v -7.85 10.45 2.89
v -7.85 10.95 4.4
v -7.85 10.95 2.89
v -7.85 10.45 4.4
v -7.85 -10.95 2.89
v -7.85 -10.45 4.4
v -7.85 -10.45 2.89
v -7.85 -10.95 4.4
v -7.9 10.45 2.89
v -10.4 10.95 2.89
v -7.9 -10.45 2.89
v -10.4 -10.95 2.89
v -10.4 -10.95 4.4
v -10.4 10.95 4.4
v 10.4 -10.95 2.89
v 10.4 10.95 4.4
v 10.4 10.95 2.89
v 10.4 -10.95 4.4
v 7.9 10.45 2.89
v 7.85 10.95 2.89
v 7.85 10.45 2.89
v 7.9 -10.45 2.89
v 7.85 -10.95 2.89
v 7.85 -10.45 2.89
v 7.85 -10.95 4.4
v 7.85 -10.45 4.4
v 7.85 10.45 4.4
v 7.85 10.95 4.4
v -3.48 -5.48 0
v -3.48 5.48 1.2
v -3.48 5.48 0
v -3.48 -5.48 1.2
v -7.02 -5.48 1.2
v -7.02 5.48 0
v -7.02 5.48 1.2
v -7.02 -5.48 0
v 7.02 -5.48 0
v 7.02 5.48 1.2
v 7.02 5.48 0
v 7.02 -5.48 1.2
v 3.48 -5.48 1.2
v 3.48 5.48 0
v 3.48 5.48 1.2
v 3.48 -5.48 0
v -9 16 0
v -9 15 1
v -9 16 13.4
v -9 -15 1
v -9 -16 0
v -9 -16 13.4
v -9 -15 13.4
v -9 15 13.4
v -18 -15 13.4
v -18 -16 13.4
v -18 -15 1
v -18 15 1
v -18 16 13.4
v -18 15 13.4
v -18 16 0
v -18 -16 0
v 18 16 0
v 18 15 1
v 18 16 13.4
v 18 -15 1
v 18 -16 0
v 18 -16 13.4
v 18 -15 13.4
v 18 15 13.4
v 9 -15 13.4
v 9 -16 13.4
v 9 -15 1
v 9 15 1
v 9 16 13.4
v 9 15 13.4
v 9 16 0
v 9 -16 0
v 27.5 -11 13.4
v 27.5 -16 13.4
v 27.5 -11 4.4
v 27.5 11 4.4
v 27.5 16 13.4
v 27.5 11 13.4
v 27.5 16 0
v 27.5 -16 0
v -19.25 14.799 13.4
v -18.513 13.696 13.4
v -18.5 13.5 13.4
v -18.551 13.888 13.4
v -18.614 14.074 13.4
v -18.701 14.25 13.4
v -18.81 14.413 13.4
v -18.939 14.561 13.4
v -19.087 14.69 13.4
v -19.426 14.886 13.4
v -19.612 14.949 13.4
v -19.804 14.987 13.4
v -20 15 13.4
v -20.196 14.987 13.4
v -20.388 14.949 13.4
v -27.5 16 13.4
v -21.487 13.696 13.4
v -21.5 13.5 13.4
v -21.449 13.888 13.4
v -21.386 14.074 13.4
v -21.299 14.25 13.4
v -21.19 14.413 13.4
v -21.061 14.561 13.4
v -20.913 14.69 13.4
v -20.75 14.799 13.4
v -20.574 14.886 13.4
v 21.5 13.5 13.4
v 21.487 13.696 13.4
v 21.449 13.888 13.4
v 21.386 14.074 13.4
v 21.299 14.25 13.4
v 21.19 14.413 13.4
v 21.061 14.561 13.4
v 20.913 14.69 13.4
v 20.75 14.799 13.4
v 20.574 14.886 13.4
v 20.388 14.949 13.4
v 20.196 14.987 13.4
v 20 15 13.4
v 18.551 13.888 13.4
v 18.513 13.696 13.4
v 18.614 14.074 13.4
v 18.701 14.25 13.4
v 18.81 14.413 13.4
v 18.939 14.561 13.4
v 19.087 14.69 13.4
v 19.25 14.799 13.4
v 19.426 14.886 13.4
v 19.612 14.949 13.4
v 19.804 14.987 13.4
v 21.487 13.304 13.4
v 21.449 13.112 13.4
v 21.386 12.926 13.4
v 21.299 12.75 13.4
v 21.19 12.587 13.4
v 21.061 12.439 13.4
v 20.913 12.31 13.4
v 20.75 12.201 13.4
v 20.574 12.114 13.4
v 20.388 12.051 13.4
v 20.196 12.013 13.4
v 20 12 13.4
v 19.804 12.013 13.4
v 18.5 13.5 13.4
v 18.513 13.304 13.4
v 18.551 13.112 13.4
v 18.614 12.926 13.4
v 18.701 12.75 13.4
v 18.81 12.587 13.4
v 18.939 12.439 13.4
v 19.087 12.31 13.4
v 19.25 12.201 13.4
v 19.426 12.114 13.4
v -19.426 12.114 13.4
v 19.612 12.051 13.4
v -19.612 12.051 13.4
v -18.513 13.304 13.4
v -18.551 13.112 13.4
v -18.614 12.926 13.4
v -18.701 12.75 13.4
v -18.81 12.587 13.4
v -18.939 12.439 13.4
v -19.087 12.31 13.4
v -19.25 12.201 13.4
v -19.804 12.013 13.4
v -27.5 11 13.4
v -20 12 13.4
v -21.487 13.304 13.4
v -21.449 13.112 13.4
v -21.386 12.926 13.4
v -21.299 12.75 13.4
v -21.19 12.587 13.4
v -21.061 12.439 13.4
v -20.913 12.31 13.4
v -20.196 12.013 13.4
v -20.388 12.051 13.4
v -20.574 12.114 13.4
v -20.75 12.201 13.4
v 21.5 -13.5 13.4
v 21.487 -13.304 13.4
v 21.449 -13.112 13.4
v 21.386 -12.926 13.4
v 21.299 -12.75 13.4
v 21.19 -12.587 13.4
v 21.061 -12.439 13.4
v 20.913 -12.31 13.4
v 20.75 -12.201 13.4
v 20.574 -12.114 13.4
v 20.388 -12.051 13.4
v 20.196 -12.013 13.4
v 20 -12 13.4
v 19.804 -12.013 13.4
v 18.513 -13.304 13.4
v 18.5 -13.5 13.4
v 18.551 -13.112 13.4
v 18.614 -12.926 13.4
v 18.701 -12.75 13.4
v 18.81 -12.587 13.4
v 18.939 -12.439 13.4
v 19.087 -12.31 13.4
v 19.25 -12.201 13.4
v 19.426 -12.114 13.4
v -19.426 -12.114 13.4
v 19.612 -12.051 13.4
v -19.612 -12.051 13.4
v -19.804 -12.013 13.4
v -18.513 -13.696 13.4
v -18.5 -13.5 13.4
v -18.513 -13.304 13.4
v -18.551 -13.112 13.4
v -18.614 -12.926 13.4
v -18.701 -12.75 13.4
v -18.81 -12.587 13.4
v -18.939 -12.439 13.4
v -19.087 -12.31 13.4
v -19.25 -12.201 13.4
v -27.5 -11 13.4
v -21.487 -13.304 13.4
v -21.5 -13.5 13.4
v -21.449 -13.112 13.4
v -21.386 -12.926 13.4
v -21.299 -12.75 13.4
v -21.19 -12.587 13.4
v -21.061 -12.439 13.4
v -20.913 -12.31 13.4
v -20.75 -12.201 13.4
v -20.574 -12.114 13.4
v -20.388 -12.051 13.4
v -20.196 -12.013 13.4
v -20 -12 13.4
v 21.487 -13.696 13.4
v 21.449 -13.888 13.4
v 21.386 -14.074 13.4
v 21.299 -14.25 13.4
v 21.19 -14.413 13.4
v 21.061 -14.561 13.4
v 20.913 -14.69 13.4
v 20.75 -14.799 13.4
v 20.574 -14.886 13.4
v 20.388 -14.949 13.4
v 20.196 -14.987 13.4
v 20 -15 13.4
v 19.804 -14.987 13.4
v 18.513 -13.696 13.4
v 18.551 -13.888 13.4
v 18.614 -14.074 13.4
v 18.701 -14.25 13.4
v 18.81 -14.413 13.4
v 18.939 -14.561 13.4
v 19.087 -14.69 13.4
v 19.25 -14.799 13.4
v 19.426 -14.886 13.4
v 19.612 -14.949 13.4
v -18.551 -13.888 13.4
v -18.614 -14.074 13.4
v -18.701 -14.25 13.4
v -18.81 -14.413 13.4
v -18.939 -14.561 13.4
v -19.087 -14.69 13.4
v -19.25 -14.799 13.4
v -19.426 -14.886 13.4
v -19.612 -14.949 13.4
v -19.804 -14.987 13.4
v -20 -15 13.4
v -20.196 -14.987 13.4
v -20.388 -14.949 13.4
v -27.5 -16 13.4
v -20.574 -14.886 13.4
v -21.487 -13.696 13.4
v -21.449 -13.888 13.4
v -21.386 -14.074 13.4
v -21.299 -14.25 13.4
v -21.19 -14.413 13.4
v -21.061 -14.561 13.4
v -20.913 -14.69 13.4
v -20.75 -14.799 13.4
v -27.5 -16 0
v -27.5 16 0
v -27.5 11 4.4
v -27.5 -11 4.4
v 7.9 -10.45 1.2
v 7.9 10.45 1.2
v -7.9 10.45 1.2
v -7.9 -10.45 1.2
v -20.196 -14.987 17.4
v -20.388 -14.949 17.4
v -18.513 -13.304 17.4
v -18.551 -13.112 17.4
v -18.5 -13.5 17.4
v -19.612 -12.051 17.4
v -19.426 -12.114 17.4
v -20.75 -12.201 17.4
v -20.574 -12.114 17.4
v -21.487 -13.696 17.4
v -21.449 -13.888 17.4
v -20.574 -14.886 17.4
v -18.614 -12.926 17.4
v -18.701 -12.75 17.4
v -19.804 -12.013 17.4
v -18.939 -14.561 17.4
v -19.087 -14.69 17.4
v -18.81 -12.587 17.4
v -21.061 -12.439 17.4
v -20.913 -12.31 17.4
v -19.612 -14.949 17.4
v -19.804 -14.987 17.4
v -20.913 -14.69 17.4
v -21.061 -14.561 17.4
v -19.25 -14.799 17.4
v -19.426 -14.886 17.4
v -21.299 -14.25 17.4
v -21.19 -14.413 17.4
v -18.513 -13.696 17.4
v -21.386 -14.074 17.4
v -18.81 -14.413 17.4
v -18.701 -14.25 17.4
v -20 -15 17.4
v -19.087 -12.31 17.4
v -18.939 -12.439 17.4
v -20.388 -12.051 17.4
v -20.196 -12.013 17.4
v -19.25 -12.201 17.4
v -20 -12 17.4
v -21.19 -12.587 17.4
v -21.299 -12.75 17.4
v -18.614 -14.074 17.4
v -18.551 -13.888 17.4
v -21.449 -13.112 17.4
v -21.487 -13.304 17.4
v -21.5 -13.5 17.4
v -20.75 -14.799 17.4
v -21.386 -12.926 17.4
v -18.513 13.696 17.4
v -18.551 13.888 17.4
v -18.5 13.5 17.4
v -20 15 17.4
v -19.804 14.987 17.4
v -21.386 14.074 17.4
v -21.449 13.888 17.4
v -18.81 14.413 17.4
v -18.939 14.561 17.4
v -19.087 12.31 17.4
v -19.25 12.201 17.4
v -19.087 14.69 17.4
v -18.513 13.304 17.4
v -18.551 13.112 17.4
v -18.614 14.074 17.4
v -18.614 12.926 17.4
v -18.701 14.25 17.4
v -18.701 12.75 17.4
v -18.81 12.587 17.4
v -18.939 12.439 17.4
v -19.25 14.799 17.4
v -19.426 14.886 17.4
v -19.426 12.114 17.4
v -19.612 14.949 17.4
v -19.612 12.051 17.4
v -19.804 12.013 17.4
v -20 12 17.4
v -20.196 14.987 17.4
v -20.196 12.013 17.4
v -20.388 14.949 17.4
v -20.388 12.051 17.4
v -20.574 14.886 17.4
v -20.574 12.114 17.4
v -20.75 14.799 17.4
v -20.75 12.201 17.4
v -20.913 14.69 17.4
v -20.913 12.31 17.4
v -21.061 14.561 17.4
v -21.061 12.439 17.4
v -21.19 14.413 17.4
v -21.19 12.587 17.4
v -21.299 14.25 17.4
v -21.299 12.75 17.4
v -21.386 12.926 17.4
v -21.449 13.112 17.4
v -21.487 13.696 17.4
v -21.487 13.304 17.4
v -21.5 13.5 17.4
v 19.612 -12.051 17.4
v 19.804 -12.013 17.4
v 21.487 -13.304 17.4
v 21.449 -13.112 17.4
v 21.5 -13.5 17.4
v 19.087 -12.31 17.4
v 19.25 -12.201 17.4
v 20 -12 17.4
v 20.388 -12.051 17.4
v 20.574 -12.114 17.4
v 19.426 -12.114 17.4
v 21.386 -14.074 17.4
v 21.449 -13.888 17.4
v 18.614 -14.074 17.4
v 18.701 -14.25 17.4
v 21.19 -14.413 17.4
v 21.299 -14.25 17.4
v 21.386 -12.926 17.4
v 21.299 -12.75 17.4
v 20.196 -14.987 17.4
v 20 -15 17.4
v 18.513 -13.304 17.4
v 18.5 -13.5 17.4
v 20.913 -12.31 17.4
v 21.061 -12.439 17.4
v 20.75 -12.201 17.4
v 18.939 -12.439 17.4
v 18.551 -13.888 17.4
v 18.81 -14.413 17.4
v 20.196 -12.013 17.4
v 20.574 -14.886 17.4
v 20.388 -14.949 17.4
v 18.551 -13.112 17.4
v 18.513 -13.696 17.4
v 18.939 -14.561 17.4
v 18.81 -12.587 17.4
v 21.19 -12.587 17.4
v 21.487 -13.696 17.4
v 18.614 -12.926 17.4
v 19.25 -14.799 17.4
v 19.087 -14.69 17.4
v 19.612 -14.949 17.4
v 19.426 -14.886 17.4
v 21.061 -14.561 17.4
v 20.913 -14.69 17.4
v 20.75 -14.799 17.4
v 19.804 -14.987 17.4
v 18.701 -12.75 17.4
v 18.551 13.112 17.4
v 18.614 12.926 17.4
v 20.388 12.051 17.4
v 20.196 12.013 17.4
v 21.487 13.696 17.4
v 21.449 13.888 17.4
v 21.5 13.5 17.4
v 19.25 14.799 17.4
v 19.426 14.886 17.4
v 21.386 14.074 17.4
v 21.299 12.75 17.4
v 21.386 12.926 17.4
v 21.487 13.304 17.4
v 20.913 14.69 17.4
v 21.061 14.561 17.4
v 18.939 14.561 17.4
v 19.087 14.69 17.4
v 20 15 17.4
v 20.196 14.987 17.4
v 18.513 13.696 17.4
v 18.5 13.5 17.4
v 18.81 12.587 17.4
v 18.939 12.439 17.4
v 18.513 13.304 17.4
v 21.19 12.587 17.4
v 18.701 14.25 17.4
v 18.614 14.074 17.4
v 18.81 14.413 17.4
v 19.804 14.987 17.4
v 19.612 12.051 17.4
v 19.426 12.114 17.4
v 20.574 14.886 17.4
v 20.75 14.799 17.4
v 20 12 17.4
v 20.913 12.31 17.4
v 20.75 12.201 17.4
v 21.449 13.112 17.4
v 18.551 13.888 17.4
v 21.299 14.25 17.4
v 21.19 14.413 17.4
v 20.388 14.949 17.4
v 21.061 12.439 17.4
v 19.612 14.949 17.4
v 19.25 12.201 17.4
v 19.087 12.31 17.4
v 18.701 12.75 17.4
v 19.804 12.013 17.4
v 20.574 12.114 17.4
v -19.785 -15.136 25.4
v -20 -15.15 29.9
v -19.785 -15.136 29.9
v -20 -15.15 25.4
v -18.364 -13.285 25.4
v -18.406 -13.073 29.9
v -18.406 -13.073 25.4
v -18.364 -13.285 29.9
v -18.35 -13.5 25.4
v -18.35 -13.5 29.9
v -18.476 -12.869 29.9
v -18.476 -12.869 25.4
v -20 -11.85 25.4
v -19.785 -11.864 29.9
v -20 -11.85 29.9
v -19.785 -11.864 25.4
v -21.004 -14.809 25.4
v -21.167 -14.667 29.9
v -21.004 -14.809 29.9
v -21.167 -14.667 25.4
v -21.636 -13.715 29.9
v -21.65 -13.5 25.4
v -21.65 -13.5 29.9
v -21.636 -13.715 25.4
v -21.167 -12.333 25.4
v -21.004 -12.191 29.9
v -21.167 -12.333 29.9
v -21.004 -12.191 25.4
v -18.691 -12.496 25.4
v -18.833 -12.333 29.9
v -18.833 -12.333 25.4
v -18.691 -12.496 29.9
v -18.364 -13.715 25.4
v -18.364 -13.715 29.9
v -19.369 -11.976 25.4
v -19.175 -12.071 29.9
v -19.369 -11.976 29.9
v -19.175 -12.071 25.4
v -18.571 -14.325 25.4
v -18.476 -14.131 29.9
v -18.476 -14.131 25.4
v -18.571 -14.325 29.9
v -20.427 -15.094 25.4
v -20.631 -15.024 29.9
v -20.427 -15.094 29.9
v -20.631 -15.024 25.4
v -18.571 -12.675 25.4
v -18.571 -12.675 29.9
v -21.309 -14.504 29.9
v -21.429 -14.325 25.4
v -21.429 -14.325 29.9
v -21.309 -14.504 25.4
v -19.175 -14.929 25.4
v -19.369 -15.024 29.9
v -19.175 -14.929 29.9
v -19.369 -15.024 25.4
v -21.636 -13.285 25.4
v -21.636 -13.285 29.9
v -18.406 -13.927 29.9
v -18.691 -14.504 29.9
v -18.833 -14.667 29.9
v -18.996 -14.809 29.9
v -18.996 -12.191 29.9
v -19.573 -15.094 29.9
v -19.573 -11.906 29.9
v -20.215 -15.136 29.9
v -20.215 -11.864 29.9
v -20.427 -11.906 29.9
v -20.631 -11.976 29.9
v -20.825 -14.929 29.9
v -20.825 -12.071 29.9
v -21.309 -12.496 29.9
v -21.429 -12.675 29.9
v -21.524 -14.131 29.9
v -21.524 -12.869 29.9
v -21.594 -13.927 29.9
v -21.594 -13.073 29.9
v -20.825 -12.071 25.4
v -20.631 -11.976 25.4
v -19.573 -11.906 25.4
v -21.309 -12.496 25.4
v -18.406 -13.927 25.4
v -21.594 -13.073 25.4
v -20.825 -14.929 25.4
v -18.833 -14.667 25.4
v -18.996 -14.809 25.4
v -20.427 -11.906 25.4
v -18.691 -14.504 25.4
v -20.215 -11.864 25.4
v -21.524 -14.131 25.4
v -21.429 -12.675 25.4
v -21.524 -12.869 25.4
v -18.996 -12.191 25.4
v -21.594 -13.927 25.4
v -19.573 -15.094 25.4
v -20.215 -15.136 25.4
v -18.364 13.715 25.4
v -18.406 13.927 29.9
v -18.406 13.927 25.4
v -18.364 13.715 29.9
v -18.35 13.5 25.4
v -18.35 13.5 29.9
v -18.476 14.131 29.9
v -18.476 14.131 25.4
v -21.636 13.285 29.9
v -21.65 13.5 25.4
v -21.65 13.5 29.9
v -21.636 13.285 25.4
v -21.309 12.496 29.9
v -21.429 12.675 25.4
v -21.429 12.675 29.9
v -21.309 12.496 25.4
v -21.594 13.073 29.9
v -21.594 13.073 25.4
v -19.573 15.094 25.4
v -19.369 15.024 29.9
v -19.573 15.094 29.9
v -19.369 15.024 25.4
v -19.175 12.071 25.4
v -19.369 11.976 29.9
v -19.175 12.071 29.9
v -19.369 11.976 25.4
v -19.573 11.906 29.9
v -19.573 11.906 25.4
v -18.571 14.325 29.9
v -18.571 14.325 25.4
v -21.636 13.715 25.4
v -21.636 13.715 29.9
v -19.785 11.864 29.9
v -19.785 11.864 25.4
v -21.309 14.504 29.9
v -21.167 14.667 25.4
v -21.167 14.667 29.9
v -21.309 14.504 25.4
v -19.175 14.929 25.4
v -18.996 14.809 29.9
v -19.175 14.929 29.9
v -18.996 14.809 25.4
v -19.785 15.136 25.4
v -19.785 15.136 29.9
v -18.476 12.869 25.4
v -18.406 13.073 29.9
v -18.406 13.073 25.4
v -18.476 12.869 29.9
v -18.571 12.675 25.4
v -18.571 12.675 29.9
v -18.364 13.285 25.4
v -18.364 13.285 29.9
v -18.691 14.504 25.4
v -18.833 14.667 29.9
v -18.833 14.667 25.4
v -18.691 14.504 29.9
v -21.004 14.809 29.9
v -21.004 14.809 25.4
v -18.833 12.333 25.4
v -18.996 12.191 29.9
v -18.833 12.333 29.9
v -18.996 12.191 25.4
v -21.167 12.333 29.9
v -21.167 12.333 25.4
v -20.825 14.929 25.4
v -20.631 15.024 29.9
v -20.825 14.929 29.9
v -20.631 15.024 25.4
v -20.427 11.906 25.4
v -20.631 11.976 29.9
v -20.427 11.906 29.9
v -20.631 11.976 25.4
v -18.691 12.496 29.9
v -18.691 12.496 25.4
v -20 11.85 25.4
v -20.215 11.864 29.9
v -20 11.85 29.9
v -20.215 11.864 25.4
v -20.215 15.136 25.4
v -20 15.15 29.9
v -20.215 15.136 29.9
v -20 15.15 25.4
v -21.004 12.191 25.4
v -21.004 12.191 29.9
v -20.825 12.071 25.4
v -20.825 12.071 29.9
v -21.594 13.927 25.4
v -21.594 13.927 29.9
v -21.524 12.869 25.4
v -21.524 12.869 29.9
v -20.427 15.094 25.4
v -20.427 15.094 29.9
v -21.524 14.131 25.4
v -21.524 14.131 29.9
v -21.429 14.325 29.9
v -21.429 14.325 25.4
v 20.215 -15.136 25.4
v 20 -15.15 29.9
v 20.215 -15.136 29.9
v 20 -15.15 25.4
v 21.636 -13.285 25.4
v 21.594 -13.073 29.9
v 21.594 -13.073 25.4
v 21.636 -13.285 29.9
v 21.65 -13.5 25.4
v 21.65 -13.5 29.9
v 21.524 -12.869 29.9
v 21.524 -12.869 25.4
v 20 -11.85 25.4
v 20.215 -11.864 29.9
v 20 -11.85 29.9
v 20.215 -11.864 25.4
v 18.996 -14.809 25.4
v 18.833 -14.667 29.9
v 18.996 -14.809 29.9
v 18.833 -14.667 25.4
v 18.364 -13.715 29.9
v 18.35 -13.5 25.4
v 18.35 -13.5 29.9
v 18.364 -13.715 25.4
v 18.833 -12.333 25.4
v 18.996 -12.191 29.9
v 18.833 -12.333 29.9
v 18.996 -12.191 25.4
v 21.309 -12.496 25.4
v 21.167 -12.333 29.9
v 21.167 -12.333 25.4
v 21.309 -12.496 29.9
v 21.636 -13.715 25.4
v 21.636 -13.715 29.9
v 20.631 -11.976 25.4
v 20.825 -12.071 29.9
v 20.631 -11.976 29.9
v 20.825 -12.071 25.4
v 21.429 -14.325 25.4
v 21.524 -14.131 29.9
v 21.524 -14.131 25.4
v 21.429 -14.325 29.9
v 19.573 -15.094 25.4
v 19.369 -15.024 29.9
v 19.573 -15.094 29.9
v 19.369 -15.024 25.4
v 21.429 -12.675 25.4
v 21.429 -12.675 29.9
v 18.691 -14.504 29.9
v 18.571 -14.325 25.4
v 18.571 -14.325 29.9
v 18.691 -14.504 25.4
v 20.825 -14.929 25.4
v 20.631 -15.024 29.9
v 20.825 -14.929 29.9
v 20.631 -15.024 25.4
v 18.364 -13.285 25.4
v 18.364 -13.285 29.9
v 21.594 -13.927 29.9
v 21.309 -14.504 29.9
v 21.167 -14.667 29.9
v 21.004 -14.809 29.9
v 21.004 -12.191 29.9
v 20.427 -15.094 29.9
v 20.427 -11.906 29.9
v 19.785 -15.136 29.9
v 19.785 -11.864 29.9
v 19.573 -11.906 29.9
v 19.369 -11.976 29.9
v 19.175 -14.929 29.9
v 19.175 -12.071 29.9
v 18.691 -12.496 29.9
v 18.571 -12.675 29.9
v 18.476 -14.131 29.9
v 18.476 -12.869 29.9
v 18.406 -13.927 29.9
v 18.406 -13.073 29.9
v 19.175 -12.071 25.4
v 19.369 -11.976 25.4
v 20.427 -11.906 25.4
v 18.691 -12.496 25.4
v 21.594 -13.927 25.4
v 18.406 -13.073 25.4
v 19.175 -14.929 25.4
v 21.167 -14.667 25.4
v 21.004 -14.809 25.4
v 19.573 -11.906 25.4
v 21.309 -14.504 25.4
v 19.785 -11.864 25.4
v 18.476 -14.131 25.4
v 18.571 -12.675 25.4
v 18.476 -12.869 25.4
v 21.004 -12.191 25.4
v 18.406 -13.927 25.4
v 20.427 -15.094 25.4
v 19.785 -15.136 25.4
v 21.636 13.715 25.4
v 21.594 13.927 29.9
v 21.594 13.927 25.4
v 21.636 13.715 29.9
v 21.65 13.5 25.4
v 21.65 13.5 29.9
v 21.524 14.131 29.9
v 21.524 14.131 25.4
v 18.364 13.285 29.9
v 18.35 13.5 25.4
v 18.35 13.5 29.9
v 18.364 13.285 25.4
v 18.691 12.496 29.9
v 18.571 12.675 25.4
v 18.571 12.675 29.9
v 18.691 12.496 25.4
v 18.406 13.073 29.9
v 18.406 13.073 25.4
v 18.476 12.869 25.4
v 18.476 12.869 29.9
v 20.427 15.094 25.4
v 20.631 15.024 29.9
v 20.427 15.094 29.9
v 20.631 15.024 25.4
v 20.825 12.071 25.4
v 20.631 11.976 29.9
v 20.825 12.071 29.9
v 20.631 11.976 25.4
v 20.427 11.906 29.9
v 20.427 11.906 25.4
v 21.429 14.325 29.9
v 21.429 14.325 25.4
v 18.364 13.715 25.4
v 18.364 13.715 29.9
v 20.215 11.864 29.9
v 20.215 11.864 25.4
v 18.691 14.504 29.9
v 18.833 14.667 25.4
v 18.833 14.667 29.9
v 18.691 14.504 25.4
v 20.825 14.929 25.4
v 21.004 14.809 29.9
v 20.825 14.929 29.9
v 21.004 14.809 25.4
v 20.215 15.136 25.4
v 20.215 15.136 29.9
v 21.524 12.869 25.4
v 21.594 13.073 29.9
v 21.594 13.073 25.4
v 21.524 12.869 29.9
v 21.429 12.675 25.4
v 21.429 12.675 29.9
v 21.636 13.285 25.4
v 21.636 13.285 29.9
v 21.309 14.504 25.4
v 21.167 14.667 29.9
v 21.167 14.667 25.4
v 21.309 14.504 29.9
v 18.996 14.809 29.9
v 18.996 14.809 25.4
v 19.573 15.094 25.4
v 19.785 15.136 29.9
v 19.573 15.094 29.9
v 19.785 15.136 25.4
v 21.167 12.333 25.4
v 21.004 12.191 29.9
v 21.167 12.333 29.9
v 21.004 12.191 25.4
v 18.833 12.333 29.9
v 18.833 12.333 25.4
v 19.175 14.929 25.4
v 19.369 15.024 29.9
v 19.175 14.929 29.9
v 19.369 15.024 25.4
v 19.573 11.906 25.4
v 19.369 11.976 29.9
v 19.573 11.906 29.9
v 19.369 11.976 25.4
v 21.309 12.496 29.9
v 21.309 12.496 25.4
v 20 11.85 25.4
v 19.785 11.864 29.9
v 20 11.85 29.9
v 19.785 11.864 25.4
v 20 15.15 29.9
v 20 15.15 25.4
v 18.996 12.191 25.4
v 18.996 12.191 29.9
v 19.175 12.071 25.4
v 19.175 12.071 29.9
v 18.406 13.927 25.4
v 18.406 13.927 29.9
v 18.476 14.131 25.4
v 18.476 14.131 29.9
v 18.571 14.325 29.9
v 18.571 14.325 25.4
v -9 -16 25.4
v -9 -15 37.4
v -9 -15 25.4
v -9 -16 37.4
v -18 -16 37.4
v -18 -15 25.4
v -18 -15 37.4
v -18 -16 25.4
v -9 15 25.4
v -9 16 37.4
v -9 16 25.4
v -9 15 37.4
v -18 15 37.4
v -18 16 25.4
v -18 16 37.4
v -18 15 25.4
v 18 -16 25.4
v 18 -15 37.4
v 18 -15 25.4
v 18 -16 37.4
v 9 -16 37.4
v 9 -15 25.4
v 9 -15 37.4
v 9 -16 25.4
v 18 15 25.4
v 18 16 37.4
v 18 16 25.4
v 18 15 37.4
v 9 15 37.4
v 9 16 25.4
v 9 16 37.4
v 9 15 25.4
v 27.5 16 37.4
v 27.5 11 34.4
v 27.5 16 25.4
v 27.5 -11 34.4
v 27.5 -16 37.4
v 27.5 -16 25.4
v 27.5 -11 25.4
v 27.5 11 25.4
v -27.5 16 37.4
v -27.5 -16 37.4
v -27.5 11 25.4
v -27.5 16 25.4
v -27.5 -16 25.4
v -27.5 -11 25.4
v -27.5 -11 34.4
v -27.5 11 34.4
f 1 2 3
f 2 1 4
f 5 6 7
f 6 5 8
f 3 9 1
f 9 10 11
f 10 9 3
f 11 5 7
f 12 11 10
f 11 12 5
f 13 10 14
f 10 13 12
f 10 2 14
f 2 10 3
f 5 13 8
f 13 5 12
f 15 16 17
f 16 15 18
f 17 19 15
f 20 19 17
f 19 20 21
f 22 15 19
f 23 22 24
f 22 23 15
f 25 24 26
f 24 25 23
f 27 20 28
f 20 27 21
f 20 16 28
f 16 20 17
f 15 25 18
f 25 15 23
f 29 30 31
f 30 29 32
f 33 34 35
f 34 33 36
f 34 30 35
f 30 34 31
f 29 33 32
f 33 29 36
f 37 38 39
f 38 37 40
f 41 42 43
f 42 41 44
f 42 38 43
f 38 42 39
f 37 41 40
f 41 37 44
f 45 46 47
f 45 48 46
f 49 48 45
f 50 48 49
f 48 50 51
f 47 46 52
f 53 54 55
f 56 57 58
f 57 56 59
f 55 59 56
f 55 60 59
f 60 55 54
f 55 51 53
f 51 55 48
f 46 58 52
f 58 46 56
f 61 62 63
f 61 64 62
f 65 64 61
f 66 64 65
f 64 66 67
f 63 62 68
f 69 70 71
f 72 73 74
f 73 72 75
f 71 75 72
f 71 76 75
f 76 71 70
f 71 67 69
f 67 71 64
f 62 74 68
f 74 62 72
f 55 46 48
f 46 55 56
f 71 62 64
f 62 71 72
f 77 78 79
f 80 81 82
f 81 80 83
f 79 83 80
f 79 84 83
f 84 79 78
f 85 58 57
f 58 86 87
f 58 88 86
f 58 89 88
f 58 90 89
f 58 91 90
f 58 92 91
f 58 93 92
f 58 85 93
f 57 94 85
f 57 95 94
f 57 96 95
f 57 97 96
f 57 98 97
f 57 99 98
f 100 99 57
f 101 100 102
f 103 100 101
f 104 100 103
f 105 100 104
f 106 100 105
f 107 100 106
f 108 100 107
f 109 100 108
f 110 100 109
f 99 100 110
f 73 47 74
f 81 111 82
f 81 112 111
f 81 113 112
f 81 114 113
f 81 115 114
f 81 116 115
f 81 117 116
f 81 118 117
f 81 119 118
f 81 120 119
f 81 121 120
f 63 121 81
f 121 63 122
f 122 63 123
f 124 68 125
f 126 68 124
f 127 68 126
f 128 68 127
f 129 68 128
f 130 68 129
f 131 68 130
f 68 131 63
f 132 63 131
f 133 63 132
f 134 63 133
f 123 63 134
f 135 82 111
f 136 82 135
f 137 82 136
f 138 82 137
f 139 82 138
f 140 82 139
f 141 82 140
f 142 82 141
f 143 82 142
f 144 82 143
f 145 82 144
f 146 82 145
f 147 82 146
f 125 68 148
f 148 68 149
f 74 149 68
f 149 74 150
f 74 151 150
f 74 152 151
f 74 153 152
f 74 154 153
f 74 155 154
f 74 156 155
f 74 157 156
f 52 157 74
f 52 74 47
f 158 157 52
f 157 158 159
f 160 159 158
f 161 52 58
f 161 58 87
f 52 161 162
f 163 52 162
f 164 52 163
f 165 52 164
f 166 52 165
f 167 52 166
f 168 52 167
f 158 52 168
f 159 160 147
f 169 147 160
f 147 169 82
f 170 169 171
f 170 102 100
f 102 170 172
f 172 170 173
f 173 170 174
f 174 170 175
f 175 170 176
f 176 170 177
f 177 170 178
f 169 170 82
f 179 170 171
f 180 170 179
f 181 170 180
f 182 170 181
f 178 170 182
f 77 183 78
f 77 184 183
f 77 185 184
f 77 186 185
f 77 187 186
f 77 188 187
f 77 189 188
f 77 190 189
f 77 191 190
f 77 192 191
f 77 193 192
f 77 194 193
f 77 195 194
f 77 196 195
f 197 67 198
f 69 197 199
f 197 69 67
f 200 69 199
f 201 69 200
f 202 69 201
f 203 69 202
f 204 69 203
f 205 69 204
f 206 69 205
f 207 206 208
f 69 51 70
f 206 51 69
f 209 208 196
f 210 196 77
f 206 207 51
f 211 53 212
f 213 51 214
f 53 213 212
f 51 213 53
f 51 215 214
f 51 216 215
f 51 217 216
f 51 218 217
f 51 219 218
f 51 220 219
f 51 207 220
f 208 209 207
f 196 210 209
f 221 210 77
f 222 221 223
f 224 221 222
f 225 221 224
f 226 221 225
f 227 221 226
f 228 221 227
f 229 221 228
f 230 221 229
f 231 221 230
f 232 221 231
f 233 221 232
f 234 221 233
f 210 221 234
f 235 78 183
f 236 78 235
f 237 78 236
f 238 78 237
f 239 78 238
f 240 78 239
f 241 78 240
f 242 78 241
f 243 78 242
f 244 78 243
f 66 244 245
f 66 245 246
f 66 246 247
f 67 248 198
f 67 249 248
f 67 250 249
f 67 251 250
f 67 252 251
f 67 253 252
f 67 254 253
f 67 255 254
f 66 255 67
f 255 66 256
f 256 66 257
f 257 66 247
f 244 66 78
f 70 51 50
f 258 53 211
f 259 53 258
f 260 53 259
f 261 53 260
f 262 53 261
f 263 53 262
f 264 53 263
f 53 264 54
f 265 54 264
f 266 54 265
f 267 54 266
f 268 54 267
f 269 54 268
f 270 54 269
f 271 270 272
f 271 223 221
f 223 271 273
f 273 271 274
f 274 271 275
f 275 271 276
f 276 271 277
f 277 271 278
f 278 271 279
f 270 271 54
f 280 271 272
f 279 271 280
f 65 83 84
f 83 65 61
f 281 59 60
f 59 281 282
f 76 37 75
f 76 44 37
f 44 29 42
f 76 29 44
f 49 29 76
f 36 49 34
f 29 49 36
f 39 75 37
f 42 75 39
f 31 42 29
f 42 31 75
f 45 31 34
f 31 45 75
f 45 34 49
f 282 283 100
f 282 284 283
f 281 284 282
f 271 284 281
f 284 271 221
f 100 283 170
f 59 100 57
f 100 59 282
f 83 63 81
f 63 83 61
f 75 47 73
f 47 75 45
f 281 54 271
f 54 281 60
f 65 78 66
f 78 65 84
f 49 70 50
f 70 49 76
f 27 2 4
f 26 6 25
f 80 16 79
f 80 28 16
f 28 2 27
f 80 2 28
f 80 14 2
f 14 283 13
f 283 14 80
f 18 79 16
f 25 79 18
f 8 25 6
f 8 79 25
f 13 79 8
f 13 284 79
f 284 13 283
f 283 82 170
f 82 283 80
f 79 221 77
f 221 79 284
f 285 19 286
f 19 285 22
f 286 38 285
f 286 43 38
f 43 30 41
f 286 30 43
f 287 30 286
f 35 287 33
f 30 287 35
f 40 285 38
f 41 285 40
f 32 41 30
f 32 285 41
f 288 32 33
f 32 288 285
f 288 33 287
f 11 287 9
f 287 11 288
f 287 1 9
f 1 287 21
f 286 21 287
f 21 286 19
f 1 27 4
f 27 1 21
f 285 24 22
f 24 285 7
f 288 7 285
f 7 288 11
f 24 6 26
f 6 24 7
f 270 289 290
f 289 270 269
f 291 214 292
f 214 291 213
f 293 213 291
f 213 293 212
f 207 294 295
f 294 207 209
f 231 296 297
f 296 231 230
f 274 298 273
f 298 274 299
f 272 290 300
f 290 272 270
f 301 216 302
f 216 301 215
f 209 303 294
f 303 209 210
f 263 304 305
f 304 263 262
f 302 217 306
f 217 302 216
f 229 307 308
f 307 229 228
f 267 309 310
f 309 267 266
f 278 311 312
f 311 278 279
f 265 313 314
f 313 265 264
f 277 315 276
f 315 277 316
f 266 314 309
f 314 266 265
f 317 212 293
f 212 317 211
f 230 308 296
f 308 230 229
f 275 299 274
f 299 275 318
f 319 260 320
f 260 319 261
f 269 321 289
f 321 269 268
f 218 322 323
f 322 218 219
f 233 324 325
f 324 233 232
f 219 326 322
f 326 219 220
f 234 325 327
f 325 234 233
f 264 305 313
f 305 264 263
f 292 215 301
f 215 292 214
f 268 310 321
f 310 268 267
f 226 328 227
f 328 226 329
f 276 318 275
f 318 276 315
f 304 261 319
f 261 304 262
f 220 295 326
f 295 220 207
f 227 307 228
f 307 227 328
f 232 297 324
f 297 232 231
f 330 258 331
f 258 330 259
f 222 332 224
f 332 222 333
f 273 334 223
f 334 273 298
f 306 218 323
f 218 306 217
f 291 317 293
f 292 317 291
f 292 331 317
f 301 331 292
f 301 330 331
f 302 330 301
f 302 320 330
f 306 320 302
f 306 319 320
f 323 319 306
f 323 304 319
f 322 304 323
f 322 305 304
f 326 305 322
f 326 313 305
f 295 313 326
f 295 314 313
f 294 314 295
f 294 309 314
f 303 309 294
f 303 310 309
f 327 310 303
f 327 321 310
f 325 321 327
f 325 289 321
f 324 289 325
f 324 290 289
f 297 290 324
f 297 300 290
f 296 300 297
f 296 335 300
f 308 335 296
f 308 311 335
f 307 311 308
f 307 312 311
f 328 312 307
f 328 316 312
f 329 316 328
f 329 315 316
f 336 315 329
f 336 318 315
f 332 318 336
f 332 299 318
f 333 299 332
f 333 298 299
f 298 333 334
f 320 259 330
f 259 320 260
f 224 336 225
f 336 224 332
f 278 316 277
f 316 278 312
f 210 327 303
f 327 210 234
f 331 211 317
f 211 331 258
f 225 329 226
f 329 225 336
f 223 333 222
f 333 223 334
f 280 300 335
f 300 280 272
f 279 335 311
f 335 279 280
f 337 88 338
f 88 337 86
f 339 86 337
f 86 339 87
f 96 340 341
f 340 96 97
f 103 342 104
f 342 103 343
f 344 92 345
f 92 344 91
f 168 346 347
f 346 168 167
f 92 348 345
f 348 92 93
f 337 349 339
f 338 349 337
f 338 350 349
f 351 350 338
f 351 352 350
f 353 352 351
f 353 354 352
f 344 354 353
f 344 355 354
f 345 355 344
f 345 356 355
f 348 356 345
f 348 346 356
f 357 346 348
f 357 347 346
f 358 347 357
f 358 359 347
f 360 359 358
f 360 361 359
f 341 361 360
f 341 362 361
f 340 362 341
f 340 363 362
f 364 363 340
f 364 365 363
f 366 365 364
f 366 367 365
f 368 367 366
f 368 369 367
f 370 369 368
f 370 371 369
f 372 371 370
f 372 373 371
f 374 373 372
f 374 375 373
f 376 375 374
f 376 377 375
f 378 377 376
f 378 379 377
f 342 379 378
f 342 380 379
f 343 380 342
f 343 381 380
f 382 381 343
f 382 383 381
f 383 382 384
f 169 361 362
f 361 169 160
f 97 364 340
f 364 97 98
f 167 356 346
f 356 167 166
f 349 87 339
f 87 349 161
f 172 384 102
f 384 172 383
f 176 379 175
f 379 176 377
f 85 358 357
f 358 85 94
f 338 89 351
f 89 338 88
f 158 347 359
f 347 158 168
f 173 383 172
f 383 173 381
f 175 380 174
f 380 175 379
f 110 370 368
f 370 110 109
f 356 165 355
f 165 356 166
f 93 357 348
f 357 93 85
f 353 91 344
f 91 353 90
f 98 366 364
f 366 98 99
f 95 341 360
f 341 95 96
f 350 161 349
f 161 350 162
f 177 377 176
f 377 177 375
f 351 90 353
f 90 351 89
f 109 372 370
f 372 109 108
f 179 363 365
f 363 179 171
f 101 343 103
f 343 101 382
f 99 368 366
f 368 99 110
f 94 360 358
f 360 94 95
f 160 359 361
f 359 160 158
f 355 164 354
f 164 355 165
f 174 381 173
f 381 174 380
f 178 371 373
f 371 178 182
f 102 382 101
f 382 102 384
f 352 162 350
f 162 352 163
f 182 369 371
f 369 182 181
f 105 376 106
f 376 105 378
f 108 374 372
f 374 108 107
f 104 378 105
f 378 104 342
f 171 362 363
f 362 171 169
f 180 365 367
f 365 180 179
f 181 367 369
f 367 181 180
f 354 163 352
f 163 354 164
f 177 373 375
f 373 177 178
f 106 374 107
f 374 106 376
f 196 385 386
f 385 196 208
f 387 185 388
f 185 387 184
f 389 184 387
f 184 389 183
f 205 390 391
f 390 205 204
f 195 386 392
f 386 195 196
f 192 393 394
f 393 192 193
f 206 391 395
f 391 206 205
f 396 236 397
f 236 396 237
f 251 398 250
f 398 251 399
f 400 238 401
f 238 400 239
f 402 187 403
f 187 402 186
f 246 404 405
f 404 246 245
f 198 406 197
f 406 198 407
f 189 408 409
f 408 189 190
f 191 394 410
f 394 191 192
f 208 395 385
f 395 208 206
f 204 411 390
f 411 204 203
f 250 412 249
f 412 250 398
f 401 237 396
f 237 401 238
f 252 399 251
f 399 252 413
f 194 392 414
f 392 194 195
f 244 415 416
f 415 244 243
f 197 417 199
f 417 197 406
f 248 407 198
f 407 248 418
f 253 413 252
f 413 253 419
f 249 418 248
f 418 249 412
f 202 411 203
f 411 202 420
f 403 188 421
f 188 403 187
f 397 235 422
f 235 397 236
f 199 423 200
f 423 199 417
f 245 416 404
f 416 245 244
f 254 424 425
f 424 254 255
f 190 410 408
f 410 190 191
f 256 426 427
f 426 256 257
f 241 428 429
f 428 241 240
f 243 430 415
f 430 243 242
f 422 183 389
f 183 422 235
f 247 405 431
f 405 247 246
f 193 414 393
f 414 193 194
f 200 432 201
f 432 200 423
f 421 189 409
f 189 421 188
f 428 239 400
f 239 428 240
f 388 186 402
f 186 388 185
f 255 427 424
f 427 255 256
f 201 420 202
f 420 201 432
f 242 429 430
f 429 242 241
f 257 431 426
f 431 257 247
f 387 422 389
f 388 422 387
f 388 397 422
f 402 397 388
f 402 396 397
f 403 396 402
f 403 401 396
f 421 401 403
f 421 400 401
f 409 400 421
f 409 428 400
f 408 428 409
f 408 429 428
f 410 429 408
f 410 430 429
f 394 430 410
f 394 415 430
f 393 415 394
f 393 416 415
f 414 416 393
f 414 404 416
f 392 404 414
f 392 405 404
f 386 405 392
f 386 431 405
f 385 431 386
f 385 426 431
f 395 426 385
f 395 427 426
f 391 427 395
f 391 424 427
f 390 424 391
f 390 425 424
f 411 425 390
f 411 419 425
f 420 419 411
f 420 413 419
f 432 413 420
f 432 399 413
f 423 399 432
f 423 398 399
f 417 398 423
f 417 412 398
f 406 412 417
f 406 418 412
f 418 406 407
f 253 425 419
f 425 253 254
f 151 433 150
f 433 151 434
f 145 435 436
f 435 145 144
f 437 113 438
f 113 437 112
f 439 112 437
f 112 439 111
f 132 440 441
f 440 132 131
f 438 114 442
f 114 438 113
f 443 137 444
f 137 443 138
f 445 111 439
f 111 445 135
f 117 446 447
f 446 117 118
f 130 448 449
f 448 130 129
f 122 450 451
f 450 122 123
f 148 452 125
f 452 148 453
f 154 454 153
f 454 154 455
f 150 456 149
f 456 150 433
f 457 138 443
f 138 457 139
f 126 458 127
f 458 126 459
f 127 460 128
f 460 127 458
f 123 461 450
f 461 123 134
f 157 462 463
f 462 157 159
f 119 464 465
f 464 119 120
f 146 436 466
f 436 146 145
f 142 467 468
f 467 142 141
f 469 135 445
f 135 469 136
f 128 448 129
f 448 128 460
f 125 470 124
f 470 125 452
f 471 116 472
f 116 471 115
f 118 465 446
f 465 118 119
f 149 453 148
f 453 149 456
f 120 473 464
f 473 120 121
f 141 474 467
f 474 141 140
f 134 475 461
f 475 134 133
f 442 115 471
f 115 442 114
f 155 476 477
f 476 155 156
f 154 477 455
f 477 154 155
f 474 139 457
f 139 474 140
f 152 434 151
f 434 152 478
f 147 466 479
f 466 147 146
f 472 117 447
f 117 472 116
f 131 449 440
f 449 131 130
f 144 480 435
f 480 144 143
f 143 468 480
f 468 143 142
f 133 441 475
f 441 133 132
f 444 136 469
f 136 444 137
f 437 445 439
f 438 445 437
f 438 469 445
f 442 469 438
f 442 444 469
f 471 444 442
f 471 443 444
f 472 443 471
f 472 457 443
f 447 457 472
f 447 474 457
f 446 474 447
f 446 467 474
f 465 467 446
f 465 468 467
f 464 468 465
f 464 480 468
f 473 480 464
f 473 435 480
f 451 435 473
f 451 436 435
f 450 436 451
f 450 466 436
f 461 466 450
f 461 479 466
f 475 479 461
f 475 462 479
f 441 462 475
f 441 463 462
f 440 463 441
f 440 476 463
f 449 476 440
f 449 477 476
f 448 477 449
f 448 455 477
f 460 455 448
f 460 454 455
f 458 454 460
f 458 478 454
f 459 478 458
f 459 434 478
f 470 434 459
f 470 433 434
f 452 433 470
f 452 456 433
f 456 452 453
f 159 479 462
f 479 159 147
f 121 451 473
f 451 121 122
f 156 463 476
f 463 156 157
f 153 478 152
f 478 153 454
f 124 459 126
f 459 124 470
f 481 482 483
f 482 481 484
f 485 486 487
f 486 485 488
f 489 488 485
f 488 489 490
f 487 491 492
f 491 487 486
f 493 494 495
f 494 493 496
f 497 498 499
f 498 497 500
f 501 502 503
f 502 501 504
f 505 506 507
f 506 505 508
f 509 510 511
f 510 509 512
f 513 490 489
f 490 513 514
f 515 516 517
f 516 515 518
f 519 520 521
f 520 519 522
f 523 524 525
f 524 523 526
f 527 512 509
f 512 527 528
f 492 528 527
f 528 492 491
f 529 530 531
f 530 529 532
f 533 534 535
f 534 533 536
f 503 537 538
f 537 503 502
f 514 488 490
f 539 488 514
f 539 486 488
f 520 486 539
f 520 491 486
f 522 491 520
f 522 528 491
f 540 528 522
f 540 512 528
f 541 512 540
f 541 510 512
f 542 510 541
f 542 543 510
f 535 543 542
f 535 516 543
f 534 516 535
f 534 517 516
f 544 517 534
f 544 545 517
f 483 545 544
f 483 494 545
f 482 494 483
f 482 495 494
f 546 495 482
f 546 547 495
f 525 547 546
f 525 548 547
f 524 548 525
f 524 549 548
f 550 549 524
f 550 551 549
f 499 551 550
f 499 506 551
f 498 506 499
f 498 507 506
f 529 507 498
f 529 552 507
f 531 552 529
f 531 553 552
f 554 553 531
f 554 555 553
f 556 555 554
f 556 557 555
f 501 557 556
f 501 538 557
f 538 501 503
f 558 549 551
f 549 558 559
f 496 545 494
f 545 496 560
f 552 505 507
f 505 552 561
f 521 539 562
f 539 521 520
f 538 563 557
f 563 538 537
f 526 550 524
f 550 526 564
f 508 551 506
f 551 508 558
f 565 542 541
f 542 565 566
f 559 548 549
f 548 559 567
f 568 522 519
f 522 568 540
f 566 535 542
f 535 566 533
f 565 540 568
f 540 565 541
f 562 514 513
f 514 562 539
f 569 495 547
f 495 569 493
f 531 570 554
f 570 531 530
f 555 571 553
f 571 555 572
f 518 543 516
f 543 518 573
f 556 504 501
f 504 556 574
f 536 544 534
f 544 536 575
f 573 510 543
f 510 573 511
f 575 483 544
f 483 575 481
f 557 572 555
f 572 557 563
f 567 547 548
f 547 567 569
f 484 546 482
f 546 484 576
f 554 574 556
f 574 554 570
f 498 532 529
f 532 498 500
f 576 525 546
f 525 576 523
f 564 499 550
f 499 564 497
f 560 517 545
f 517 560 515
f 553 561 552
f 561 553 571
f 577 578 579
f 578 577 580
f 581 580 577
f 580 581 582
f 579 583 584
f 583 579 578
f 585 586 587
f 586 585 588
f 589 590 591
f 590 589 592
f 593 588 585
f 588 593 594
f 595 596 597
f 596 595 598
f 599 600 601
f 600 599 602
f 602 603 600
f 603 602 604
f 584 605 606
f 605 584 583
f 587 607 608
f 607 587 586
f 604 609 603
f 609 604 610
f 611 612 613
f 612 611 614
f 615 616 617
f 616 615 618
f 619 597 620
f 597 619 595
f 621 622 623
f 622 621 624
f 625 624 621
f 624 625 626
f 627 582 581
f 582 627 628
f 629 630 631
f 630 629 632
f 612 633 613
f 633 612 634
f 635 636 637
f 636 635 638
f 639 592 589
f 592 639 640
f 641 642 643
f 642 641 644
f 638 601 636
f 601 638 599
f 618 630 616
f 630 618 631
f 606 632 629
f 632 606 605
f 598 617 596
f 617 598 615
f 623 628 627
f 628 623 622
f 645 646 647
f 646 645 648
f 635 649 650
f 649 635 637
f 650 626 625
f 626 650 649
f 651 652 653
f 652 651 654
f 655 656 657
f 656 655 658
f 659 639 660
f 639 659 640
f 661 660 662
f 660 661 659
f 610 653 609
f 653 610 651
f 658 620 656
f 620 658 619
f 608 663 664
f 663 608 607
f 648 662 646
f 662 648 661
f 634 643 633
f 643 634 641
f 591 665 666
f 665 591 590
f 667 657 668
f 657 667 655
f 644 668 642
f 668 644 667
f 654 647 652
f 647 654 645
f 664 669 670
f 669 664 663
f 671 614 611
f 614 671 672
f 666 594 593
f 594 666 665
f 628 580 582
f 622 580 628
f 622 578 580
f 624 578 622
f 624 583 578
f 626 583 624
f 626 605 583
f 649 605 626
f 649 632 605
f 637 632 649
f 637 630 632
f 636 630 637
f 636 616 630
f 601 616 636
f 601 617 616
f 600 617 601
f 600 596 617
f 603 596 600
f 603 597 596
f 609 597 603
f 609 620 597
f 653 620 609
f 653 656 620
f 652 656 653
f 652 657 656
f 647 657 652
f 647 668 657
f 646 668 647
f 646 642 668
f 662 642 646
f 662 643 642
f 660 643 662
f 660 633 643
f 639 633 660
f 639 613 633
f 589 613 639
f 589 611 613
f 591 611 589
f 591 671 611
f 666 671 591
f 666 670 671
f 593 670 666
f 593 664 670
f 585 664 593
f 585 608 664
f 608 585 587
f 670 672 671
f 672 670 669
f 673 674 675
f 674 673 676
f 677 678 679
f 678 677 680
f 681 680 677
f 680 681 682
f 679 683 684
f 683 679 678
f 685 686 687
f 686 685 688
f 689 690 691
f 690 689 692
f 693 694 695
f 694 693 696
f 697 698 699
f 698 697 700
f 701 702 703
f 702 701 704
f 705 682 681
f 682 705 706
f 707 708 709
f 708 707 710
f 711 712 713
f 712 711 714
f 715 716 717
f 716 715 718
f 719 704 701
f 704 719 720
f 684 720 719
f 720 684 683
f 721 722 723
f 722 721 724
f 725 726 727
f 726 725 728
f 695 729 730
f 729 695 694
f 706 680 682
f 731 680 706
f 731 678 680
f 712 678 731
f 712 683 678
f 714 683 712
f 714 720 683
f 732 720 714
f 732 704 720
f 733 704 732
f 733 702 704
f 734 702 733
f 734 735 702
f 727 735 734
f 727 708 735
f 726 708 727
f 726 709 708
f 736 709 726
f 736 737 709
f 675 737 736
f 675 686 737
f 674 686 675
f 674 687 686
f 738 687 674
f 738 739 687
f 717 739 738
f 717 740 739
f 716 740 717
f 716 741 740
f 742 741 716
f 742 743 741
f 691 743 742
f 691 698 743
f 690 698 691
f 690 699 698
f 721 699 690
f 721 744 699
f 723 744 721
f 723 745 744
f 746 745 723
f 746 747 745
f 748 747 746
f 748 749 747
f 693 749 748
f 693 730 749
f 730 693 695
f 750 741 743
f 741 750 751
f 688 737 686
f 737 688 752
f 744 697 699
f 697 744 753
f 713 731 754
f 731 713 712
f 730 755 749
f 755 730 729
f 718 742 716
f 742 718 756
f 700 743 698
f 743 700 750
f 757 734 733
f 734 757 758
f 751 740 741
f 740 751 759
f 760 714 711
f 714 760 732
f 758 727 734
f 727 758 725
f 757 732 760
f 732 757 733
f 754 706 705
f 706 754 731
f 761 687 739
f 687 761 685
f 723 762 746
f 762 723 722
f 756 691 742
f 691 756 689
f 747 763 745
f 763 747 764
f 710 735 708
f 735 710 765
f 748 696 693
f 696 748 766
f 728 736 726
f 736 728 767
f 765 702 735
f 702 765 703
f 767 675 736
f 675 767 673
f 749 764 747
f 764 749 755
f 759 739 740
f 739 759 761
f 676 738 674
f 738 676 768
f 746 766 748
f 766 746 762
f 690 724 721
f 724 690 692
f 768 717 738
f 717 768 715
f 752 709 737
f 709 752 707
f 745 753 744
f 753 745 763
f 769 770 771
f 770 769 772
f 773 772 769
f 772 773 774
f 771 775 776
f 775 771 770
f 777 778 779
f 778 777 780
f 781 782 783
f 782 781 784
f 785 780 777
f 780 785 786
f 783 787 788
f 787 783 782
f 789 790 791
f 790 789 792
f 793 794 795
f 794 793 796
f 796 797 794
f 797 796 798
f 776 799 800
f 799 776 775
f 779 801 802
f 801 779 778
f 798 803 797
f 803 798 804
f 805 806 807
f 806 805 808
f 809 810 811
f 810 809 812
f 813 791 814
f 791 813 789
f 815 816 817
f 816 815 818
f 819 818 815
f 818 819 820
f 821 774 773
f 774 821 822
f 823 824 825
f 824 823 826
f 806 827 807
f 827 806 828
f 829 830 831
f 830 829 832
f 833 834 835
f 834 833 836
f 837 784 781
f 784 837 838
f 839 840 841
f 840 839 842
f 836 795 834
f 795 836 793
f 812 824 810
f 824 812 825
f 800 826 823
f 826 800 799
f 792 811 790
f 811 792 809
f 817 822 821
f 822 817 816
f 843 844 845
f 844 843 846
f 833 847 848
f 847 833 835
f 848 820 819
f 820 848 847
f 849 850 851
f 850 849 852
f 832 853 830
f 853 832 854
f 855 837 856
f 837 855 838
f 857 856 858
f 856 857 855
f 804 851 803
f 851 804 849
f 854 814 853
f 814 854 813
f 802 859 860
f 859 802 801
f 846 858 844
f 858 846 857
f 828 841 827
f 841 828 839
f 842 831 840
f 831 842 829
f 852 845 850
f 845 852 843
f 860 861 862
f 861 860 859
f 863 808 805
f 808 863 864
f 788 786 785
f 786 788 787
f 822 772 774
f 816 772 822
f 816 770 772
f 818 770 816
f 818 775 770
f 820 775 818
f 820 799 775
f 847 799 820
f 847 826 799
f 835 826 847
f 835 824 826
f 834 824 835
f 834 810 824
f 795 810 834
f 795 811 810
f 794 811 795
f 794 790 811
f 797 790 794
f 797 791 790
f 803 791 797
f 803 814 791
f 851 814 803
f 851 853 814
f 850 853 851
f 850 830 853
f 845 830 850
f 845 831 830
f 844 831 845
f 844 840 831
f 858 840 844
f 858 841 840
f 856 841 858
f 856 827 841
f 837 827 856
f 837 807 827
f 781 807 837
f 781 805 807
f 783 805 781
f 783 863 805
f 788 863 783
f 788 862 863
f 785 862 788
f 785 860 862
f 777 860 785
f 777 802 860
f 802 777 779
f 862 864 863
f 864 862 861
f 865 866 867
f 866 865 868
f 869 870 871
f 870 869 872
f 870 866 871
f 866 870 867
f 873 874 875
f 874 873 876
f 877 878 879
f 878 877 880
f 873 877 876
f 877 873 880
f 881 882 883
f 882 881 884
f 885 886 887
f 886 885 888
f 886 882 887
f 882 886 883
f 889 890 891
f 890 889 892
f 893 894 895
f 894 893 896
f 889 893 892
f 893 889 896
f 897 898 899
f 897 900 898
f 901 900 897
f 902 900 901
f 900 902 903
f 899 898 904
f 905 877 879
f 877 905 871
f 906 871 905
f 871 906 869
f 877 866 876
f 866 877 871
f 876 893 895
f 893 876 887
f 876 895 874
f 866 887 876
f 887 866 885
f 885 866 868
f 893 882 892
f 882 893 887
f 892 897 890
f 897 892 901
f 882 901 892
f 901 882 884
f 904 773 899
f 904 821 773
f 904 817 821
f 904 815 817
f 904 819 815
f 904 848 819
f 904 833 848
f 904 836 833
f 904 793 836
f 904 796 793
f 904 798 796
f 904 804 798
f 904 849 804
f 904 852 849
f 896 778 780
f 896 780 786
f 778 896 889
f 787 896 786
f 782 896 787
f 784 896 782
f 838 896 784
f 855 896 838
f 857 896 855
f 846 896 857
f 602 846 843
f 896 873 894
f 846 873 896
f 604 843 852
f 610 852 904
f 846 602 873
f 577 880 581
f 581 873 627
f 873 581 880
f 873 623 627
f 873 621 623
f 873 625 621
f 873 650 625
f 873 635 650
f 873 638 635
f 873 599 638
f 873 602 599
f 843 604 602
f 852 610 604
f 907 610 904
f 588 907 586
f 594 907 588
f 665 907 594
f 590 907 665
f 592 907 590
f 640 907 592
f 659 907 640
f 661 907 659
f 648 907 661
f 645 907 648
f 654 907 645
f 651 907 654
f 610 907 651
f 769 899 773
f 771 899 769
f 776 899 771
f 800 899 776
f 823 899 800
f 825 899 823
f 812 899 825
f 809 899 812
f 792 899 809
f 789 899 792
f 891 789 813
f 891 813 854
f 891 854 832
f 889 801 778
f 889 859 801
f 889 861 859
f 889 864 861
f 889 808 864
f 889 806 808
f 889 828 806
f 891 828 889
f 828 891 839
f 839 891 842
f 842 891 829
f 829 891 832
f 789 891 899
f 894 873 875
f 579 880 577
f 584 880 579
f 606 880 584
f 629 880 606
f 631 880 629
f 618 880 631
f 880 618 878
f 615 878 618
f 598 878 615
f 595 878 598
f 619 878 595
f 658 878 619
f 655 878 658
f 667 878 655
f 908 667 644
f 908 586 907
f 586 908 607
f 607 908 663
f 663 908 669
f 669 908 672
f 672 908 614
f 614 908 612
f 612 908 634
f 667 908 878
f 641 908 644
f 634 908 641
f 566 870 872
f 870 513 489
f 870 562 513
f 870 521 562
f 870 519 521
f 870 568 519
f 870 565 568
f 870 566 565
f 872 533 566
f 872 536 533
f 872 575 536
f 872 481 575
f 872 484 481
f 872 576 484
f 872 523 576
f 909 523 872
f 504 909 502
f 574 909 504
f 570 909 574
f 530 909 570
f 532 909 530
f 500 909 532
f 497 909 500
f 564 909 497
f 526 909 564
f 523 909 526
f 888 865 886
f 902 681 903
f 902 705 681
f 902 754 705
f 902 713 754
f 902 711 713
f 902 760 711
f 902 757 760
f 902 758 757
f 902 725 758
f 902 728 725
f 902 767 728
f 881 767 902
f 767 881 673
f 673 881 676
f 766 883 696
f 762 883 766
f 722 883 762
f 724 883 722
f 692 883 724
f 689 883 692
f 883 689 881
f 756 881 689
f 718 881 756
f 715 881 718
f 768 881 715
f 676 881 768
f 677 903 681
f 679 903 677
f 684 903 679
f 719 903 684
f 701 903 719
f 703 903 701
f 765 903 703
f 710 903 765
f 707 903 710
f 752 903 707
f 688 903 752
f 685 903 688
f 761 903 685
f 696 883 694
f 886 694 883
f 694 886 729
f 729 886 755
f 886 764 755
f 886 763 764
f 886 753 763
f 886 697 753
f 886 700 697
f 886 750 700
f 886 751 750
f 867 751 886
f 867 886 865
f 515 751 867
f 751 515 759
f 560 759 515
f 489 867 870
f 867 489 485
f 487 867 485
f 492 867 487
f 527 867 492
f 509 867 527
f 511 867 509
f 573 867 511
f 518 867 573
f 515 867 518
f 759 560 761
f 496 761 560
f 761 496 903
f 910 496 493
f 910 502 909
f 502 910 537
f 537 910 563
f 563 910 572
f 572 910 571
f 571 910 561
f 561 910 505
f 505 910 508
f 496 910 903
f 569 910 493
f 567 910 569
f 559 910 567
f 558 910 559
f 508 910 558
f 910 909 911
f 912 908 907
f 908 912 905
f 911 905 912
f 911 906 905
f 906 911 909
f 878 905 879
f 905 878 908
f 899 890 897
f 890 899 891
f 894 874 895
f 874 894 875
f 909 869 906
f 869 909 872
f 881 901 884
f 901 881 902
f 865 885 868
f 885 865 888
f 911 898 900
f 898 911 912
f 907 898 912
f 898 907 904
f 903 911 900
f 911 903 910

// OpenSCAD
// =============================================================================
// max30102_reflective_cradle_v2.scad
//
// Light-tight reflective finger cradle for the black MAX30102 breakout.
//
// CHANGES FROM v1 (all driven by your perfboard photos and a geometry check)
//   1. HEADERS: the photo shows pins on BOTH long edges (two rows of 4, 2.54 mm
//      pitch, about 2.5 mm in from each edge), not one 7-pin row. v1 had one
//      18.6 mm slot at the back only, so the front row would have landed on
//      solid floor. v2 cuts one slot per row.
//   2. FLOOR: v1 left only 0.7 mm of plastic under the board. v2 leaves 1.2 mm.
//   3. WINDOW HEIGHT: v1 left the sensor 0.3 mm BELOW the finger-pad surface.
//      v2 makes the sensor window flush (sensor_proud = 0.0). Tune with the
//      one parameter below after a test fit.
//   4. STRAP GROOVES: shallow grooves on the sides and underside so the velcro
//      strap does not slide off.
//   5. part = "coupon": a 10-minute print of just the pocket and slots, to
//      test-fit the real board BEFORE printing the full cradle.
//
// PRINT: matte black PLA/PETG, 0.2 mm layers, 4+ perimeters, 40%+ infill.
//   bottom: print as modelled (flat side down).
//   top:    rotate 180 deg about X in the slicer (roof on the bed).
// LIGHT:  black plastic can still pass 880 nm IR. Test a printed wall first
//   (phone camera + the sensor's IR LED). If light shows, add black paint or
//   foil tape on the inside, or raise side_wall and use 100% infill.
// SEAL:   closed-cell foam in the gasket grooves, foam rings at both finger
//   openings, thin foam under the roof so the finger is pressed gently
//   against the sensor, black foam tape along the seam if needed.
//
// Set `part` and export each STL:  "bottom" | "top" | "coupon" | "both"
// =============================================================================

$fn = 48;

/* ---- finger / shell ------------------------------------------------------ */
finger_w   = 22.0;   // channel width, mm
finger_h   = 18.0;   // channel height, mm
length     = 55.0;   // along the finger, mm
wall       = 3.0;    // lid roof thickness, mm
side_wall  = 5.0;    // side-wall thickness, mm

/* ---- MAX30102 breakout (measure with calipers and edit) ------------------ */
sensor_l   = 15.5;   // along finger, mm (board's short side)
sensor_w   = 20.6;   // across finger, mm (board's long side)
sensor_t   = 3.2;    // board + sensor IC thickness, mm - MEASURE
pocket_clr = 0.3;    // pocket clearance per axis, mm
sensor_proud = 0.0;  // sensor window vs finger-pad surface: 0 flush,
                     // +0.3 proud, -0.3 recessed

/* ---- headers: one row of pins along EACH long edge (from your photo) ----- */
row_pins   = 4;      // pins per row
hdr_pitch  = 2.54;
row_inset  = 2.5;    // pin centre to board edge, mm - MEASURE
hdr_body   = 2.54;   // header plastic width (along the finger), mm
slot_clr   = 1.0;    // extra slot length beyond the body, mm
slot_l     = hdr_body + slot_clr;                 // 3.54
slot_w     = row_pins * hdr_pitch + 0.8;          // 10.96
row_x      = sensor_l / 2.0 - row_inset;          // 5.25 from centre

/* ---- details ------------------------------------------------------------- */
pocket_z   = 1.2;                                   // plastic under the board
floor_t    = pocket_z + sensor_t + sensor_proud;    // finger-pad surface height
half_h     = finger_h / 2.0;
bottom_h   = half_h + floor_t;
top_h      = half_h + wall;
out_w      = finger_w + 2.0 * side_wall;

pocket_l   = sensor_l + pocket_clr;
pocket_w   = sensor_w + pocket_clr;
pocket_h   = sensor_t + 0.3;
gasket_w   = 2.5;
gasket_d   = 1.5;

pin_d      = 3.0;
pin_clear  = 0.3;
pin_h      = 4.0;
pin_x      = 20.0;
pin_y      = out_w / 2.0 - side_wall / 2.0;

min_skin   = 0.8;

strap_w    = 9.0;    // strap groove width, mm
strap_d    = 1.0;    // strap groove depth, mm
strap_x    = 13.5;   // groove centre from the middle, mm (clear of the pins)

part       = "both";

assert((side_wall - (pin_d + pin_clear)) / 2.0 >= min_skin,
       "side_wall too thin for the alignment holes");
assert(pin_x + (pin_d + pin_clear) / 2.0 + min_skin <= length / 2.0,
       "alignment pins too close to the ends");
assert(pocket_w + 0.4 <= finger_w, "board is wider than the channel");
assert(row_x + slot_l / 2.0 <= pocket_l / 2.0,
       "header slot runs past the pocket end");
assert(slot_w / 2.0 <= pocket_w / 2.0, "header slot wider than the pocket");
assert(pin_x - (pin_d + pin_clear) / 2.0 > pocket_l / 2.0 + gasket_w,
       "alignment pins collide with the gasket grooves");
assert(strap_x + strap_w / 2.0 < pin_x - (pin_d + pin_clear) / 2.0,
       "strap grooves collide with the alignment pins");
assert((floor_t - gasket_d) - strap_d >= 1.5,
       "underside strap groove leaves under 1.5 mm of plastic below the gasket groove");

/* ========================================================================== */
module strap_sides(h) {
    // shallow grooves on the two outside faces only (never the seam faces)
    for (sx = [-1, 1], sy = [-1, 1])
        translate([sx * strap_x, sy * (out_w / 2.0 - strap_d / 2.0 + 0.5), h / 2.0])
            cube([strap_w, strap_d + 1, h + 2], center = true);
}

module bottom() {
    difference() {
        translate([-length / 2.0, -out_w / 2.0, 0])
            cube([length, out_w, bottom_h]);

        // finger channel (bottom half)
        translate([-length / 2.0 - 1, -finger_w / 2.0, floor_t])
            cube([length + 2, finger_w, half_h + 1]);

        // sensor pocket, open to the channel
        translate([-pocket_l / 2.0, -pocket_w / 2.0, pocket_z])
            cube([pocket_l, pocket_w, pocket_h + 0.1]);

        // foam-gasket grooves in front of and behind the pocket
        for (sx = [-1, 1])
            translate([sx * (pocket_l / 2.0 + gasket_w / 2.0 - 0.025),
                       0, floor_t - gasket_d / 2.0])
                cube([gasket_w + 0.05, finger_w - 0.1, gasket_d + 0.02],
                     center = true);

        // one header slot per pin row, through the pocket floor
        for (sx = [-1, 1])
            translate([sx * row_x - slot_l / 2.0, -slot_w / 2.0, -1])
                cube([slot_l, slot_w, pocket_z + 1.1]);

        // strap grooves: both sides and the underside
        strap_sides(bottom_h);
        for (sx = [-1, 1])
            translate([sx * strap_x - strap_w / 2.0, -out_w / 2.0 - 1, -1])
                cube([strap_w, out_w + 2, strap_d + 1]);
    }

    // alignment pins
    for (sx = [-1, 1], sy = [-1, 1])
        translate([sx * pin_x, sy * pin_y, bottom_h - 1])
            cylinder(d = pin_d, h = pin_h + 1);
}

module top() {
    difference() {
        translate([-length / 2.0, -out_w / 2.0, 0])
            cube([length, out_w, top_h]);

        translate([-length / 2.0 - 1, -finger_w / 2.0, -1])
            cube([length + 2, finger_w, half_h + 1]);

        for (sx = [-1, 1], sy = [-1, 1])
            translate([sx * pin_x, sy * pin_y, -0.5])
                cylinder(d = pin_d + pin_clear, h = pin_h + 1);

        strap_sides(top_h);
    }
}

// test-fit coupon: just the pocket, slots and gasket grooves
module coupon() {
    intersection() {
        bottom();
        translate([-14, -out_w / 2.0 - 1, -1])
            cube([28, out_w + 2, floor_t + 3]);
    }
}

/* ========================================================================== */
if (part == "bottom") {
    bottom();
} else if (part == "top") {
    top();
} else if (part == "coupon") {
    coupon();
} else {
    bottom();
    translate([0, 0, bottom_h + 12])
        top();
}
